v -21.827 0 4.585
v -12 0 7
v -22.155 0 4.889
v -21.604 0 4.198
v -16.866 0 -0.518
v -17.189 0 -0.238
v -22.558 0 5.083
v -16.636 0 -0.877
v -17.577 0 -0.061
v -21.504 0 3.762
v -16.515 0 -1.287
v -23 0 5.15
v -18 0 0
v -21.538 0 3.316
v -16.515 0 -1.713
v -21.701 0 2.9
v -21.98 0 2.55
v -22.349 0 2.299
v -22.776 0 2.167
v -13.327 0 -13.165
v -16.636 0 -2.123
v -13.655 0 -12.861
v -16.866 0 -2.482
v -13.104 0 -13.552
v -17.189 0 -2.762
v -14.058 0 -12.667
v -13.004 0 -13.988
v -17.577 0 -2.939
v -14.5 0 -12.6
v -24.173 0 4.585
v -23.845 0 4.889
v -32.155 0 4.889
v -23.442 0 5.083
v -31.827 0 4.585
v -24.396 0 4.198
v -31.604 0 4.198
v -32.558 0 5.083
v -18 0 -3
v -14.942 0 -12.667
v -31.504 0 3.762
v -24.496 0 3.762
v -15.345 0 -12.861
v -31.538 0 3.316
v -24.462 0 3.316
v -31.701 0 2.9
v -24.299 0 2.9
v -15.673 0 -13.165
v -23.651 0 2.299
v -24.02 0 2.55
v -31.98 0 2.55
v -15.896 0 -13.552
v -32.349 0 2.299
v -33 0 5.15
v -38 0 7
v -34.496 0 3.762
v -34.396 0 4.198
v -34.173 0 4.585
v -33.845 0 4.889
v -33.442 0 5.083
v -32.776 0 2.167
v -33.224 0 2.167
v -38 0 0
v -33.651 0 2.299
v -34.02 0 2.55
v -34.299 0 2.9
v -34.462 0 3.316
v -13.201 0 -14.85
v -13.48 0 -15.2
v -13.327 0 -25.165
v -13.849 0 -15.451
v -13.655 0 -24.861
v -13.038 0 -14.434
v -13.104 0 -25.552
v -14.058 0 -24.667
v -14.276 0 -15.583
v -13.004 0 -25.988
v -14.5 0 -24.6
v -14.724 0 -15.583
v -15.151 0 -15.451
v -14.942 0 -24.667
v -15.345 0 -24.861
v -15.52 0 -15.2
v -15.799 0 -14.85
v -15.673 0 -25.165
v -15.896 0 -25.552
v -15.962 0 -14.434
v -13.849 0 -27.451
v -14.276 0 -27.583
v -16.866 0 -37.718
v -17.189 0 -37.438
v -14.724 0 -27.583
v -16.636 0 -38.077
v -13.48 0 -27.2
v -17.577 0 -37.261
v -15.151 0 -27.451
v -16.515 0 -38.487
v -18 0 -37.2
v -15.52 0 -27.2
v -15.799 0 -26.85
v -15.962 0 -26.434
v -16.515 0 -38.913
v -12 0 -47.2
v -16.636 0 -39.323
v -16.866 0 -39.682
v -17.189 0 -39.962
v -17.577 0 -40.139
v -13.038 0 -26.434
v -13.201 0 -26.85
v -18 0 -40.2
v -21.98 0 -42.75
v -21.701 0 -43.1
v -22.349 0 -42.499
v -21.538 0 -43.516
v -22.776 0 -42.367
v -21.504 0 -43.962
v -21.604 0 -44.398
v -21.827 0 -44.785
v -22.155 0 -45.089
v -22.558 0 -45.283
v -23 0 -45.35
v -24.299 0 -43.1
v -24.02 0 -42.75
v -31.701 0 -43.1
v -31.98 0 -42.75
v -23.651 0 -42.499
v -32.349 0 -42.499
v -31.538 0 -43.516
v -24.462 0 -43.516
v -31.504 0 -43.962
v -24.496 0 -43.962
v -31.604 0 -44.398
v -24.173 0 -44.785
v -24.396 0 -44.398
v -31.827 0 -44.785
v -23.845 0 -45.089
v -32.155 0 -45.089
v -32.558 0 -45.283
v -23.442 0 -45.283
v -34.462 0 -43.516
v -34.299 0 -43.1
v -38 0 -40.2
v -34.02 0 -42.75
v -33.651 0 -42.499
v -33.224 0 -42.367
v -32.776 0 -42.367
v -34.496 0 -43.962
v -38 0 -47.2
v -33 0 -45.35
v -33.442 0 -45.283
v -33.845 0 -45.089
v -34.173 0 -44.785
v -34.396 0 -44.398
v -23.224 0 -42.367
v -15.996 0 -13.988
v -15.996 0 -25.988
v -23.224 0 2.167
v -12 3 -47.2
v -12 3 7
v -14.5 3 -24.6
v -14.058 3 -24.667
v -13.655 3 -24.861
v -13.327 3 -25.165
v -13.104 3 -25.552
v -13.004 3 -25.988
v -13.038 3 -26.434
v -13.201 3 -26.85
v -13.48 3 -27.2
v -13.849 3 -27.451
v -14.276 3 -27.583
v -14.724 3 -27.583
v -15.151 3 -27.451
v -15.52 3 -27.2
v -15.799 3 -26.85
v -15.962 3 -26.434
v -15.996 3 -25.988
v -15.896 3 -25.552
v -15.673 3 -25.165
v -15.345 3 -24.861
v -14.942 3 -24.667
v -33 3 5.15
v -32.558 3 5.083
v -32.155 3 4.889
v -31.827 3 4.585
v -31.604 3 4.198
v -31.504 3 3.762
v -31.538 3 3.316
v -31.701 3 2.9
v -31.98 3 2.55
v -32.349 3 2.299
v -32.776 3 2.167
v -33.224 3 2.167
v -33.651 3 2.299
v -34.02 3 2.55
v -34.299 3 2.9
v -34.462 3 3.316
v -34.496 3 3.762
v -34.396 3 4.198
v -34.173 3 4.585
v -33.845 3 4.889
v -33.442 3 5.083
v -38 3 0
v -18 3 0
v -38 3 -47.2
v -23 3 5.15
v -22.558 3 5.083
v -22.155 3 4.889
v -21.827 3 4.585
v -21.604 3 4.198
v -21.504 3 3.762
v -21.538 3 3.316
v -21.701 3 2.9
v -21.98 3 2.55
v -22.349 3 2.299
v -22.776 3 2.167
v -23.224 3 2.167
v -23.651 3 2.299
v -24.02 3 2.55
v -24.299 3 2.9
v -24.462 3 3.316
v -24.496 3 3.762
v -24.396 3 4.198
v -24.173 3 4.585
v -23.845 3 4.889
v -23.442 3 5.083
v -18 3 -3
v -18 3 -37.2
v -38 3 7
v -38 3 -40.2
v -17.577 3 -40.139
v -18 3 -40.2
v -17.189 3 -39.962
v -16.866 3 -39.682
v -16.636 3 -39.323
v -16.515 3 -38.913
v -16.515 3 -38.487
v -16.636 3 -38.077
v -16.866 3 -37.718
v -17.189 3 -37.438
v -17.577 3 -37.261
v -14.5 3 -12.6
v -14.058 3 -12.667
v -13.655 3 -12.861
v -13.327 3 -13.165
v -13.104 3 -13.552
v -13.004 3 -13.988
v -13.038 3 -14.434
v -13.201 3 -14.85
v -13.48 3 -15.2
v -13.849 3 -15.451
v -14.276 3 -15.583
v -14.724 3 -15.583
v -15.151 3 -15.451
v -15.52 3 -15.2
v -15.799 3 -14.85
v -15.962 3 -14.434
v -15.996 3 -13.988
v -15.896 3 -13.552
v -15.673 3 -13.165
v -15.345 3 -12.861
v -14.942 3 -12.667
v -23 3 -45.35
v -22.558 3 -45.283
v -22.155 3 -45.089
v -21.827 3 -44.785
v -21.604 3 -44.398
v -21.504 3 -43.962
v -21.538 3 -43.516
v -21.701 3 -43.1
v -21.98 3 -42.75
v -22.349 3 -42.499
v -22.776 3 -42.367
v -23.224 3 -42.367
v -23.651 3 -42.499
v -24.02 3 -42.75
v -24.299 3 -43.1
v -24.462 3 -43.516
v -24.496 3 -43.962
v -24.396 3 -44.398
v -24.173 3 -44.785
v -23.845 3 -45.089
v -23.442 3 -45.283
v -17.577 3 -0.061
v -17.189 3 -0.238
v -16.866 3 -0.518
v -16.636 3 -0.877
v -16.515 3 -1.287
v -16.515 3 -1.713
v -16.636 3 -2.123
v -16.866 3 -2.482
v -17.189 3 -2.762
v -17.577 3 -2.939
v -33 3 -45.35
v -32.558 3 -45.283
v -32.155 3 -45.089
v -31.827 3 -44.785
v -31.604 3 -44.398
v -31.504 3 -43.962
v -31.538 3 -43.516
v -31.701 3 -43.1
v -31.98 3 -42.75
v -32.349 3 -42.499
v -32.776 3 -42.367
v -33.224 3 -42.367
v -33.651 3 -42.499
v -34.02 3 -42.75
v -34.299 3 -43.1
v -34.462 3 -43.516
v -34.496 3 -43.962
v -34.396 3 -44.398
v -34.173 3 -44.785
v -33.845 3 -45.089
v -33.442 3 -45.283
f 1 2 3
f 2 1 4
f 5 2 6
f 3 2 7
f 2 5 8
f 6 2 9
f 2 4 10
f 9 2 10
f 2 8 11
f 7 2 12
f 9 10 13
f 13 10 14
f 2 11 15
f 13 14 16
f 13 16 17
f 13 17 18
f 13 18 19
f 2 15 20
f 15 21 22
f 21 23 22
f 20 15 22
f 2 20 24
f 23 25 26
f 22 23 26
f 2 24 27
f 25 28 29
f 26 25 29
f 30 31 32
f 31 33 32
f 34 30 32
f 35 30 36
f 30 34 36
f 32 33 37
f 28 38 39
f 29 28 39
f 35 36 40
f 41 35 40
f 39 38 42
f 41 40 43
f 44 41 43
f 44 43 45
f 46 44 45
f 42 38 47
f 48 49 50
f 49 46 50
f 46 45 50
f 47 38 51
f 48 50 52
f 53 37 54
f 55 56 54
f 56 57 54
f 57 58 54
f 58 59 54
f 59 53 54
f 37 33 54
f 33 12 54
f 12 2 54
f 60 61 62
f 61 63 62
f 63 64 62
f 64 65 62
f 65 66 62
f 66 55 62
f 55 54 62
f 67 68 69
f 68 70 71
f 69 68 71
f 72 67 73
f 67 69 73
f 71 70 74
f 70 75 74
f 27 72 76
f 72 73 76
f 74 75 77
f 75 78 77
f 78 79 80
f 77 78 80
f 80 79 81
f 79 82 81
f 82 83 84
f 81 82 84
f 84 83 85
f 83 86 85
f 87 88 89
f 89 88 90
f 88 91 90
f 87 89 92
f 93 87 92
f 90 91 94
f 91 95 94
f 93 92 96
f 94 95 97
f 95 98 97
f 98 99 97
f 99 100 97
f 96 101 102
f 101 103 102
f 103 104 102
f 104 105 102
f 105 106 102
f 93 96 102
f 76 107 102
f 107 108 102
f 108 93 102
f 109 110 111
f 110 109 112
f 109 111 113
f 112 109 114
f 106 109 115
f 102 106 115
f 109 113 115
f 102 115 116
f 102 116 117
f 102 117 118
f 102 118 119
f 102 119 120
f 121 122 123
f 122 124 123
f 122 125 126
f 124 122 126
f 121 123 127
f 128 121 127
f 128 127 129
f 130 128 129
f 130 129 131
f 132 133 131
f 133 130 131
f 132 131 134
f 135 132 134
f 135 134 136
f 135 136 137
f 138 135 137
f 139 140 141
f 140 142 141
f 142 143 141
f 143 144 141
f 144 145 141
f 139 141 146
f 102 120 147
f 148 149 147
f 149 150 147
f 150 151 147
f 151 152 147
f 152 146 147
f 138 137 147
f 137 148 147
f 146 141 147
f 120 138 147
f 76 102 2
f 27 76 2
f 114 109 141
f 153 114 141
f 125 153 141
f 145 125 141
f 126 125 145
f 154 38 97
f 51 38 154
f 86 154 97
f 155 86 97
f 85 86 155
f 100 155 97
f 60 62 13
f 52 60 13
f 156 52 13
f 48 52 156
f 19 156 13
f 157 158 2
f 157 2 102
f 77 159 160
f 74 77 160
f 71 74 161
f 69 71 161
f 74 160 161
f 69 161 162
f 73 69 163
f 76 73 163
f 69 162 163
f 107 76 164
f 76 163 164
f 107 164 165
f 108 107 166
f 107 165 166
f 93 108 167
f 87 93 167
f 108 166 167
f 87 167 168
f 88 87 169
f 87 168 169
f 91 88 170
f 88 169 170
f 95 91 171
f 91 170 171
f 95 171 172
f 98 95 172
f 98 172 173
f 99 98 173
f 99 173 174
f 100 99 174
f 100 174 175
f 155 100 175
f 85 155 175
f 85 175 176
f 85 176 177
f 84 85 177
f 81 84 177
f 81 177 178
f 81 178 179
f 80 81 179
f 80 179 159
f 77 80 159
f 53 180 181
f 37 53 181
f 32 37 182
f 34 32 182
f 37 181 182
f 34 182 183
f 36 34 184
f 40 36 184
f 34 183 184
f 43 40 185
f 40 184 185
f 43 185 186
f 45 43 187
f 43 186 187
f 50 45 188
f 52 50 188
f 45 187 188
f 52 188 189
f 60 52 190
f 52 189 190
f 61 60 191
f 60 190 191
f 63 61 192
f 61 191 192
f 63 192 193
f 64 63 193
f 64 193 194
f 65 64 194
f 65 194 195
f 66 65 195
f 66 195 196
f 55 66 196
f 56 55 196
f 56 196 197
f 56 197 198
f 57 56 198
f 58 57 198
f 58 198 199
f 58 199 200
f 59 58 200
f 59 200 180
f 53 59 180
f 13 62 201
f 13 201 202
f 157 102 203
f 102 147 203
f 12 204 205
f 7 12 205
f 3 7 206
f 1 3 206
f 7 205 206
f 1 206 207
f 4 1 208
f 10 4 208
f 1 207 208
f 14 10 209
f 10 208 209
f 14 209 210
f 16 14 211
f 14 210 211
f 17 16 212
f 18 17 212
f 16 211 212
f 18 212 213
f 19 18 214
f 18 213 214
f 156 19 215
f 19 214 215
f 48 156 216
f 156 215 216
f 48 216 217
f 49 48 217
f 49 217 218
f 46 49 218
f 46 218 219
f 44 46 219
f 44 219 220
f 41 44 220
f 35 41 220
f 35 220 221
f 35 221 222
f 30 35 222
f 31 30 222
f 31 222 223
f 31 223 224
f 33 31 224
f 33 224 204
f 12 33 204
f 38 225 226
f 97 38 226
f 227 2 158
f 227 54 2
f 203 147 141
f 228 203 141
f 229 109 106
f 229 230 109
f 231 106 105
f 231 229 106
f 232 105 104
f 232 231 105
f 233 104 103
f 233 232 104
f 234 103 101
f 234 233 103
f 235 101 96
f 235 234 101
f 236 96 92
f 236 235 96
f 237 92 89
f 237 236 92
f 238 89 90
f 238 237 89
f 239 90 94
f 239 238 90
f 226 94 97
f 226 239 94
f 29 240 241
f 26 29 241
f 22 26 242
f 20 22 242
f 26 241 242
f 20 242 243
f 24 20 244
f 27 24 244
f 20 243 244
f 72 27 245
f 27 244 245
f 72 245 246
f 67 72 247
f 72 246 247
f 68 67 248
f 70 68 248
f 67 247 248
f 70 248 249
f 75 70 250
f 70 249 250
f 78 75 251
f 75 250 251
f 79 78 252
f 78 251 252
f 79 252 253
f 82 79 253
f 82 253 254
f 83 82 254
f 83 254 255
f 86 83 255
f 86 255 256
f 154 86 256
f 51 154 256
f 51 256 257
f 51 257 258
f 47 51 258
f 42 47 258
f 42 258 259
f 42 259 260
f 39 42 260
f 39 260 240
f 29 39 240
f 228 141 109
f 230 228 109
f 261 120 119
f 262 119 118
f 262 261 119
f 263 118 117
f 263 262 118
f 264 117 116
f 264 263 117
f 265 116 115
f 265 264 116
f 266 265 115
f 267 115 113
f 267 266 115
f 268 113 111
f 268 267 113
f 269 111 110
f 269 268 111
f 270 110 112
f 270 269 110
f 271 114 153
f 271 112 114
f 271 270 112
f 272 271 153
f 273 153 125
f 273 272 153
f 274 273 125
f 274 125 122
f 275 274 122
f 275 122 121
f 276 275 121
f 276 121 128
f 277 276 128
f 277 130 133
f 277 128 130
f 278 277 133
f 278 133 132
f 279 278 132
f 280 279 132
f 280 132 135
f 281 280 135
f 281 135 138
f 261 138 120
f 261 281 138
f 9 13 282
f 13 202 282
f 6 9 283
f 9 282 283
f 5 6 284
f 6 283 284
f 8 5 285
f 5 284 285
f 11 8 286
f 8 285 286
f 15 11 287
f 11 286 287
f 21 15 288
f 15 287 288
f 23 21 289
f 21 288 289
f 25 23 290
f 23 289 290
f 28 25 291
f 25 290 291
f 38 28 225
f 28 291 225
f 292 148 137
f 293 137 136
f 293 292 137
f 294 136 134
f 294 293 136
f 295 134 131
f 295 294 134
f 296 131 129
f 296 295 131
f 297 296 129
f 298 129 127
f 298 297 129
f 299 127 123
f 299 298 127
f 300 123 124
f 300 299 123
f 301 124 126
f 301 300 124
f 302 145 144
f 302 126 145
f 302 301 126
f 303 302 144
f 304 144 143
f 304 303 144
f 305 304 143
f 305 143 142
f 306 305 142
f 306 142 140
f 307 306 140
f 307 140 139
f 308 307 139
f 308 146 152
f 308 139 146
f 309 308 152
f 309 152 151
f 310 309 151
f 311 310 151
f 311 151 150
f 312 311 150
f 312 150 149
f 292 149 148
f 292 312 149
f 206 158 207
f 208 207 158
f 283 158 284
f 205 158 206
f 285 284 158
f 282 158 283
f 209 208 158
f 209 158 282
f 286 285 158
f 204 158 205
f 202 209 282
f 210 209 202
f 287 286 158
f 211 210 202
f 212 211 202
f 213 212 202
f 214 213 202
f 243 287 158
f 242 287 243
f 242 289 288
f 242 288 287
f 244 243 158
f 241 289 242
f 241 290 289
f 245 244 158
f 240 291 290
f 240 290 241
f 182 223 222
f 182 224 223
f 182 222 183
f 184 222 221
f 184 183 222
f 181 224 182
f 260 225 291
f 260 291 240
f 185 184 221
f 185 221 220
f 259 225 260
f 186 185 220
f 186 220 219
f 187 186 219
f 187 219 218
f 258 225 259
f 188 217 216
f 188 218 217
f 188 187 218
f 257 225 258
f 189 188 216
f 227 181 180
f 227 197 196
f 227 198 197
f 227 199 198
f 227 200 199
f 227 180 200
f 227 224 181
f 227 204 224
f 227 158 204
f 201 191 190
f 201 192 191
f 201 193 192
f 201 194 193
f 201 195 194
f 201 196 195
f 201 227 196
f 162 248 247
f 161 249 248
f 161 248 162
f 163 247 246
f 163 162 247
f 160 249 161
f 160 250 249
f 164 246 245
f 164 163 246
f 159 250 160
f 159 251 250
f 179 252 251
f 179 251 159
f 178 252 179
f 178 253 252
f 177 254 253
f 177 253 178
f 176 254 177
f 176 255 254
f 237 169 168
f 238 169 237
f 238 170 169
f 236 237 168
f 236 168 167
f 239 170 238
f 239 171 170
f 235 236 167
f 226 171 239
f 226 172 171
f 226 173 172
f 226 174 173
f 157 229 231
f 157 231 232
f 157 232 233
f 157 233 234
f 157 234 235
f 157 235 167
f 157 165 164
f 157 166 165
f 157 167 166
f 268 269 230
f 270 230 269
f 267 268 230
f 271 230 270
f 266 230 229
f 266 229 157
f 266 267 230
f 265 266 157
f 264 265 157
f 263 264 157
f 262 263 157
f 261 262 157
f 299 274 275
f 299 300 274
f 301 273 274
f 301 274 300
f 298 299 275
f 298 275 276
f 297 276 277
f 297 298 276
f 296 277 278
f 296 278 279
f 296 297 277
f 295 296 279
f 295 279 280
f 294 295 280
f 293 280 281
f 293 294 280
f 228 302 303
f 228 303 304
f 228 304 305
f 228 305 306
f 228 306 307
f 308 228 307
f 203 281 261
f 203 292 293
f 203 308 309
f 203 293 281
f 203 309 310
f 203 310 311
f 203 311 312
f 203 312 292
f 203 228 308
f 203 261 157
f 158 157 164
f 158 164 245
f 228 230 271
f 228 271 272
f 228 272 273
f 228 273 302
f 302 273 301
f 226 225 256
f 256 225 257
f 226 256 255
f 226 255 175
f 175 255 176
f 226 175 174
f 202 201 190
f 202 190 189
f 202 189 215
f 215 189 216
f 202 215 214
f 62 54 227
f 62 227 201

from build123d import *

# Parameters (mm, degrees)
SKETCH_1_W             = 38
SKETCH_1_H             = 7
EXTRUDE_1_DEPTH        = 3
SKETCH_2_W             = 7
SKETCH_2_H             = 3
EXTRUDE_2_DEPTH        = 13
SKETCH_3_R             = 1.5
CUT_EXTRUDE_1_DEPTH    = 44.0464865
SKETCH_4_R             = 1.5
CUT_EXTRUDE_2_DEPTH    = 44.0464865
SKETCH_5_W             = 5
SKETCH_5_H             = 40.2
EXTRUDE_3_DEPTH        = 3
SKETCH_6_R             = 1.5
CUT_EXTRUDE_3_DEPTH    = 56.398916957
FILLET_1_R             = 5
FILLET_2_R             = 5
FILLET_2_OF_MIRROR_1_R = 5
SKETCH_7_W             = 73.096836427
SKETCH_7_H             = 5.118381576
CUT_EXTRUDE_4_DEPTH    = 13
SKETCH_9_W             = 54.2
SKETCH_9_H             = 3
EXTRUDE_4_DEPTH        = 1
SKETCH_8_R             = 1.5
CUT_EXTRUDE_5_DEPTH    = 61.669926652


with BuildPart() as part:
    # 草图1 → 凸台-拉伸1 (new body)
    with BuildSketch(Plane(origin=(0, 0, 0), x_dir=(1, 0, 0), z_dir=(0, 1, 0))):
        with Locations((-19, -3.5)):
            Rectangle(SKETCH_1_W, SKETCH_1_H)
    extrude_1 = extrude(amount=EXTRUDE_1_DEPTH)

    # 草图2 → 凸台-拉伸2 (add)
    with BuildSketch(Plane.XY.offset(7)):
        with Locations((-3.5, 1.5)):
            Rectangle(SKETCH_2_W, SKETCH_2_H)
    extrude(amount=EXTRUDE_2_DEPTH)

    # 草图3 → 切除-拉伸1 (cut, through all)
    with BuildSketch(Plane(origin=(0, 3, 0), x_dir=(1, 0, 0), z_dir=(0, 1, 0))):
        with Locations(Location((-3.5, -15, 0), (0, 0, 270))):
            Circle(SKETCH_3_R)
        with Locations(Location((-3.5, -5, 0), (0, 0, 270))):
            Circle(SKETCH_3_R)
    extrude(amount=-CUT_EXTRUDE_1_DEPTH, mode=Mode.SUBTRACT)

    # 草图4 → 切除-拉伸2 (cut, through all)
    with BuildSketch(Plane(origin=(0, 3, 0), x_dir=(1, 0, 0), z_dir=(0, 1, 0))):
        with Locations(Location((-33, -3.65, 0), (0, 0, 270))):
            Circle(SKETCH_4_R)
        with Locations(Location((-23, -3.65, 0), (0, 0, 270))):
            Circle(SKETCH_4_R)
    cut_extrude_2 = extrude(amount=-CUT_EXTRUDE_2_DEPTH, mode=Mode.SUBTRACT)

    # 草图5 → 凸台-拉伸3 (add)
    with BuildSketch(Plane(origin=(0, 3, 0), x_dir=(1, 0, 0), z_dir=(0, 1, 0))):
        with Locations((-15.5, 20.1)):
            Rectangle(SKETCH_5_W, SKETCH_5_H)
    extrude(amount=-EXTRUDE_3_DEPTH)

    # 草图6 → 切除-拉伸3 (cut, through all)
    with BuildSketch(Plane(origin=(0, 3, 0), x_dir=(1, 0, 0), z_dir=(0, 1, 0))):
        with Locations((-18, 1.5)):
            Circle(SKETCH_6_R)
    cut_extrude_3 = extrude(amount=-CUT_EXTRUDE_3_DEPTH, mode=Mode.SUBTRACT)

    # 圆角1
    fillet_1_edges = [part.edges().sort_by_distance(p)[0] for p in [
        (-7, 1.5, 7),
    ]]
    fillet(fillet_1_edges, radius=FILLET_1_R)

    # 圆角2
    fillet_2_edges = [part.edges().sort_by_distance(p)[0] for p in [
        (-13, 1.5, 0),
    ]]
    fillet(fillet_2_edges, radius=FILLET_2_R)

    # 镜向1: 凸台-拉伸1, 切除-拉伸2, 切除-拉伸3 across plane
    add(extrude_1.mirror(Plane(origin=(0, 0, -20.1), x_dir=(1, 0, 0), z_dir=(0, 0, -1))))
    add(cut_extrude_2.mirror(Plane(origin=(0, 0, -20.1), x_dir=(1, 0, 0), z_dir=(0, 0, -1))), mode=Mode.SUBTRACT)
    add(cut_extrude_3.mirror(Plane(origin=(0, 0, -20.1), x_dir=(1, 0, 0), z_dir=(0, 0, -1))), mode=Mode.SUBTRACT)

    # 圆角2 of 镜向1
    fillet_2_of_mirror_1_edges = [part.edges().sort_by_distance(p)[0] for p in [
        (-13, 1.5, -40.2),
    ]]
    fillet(fillet_2_of_mirror_1_edges, radius=FILLET_2_OF_MIRROR_1_R)

    # 草图7 → 切除-拉伸4 (cut)
    with BuildSketch(Plane(origin=(0, 0, 0), x_dir=(0, 0, -1), z_dir=(1, 0, 0))):
        with Locations((10.651581787, 2.559190788)):
            Rectangle(SKETCH_7_W, SKETCH_7_H)
    extrude(amount=-CUT_EXTRUDE_4_DEPTH, mode=Mode.SUBTRACT)

    # 草图9 → 凸台-拉伸4 (add)
    with BuildSketch(Plane(origin=(-13, 0, 0), x_dir=(0, 0, -1), z_dir=(1, 0, 0))):
        with Locations((20.1, 1.5)):
            Rectangle(SKETCH_9_W, SKETCH_9_H)
    extrude(amount=EXTRUDE_4_DEPTH)

    # 草图8 → 切除-拉伸5 (cut, through all)
    with BuildSketch(Plane(origin=(0, 3, 0), x_dir=(1, 0, 0), z_dir=(0, 1, 0))):
        with Locations(Location((-14.5, 14.1, 0), (0, 0, 270))):
            Circle(SKETCH_8_R)
        with Locations(Location((-14.5, 26.1, 0), (0, 0, 270))):
            Circle(SKETCH_8_R)
    extrude(amount=-CUT_EXTRUDE_5_DEPTH, mode=Mode.SUBTRACT)


solid = part.part
